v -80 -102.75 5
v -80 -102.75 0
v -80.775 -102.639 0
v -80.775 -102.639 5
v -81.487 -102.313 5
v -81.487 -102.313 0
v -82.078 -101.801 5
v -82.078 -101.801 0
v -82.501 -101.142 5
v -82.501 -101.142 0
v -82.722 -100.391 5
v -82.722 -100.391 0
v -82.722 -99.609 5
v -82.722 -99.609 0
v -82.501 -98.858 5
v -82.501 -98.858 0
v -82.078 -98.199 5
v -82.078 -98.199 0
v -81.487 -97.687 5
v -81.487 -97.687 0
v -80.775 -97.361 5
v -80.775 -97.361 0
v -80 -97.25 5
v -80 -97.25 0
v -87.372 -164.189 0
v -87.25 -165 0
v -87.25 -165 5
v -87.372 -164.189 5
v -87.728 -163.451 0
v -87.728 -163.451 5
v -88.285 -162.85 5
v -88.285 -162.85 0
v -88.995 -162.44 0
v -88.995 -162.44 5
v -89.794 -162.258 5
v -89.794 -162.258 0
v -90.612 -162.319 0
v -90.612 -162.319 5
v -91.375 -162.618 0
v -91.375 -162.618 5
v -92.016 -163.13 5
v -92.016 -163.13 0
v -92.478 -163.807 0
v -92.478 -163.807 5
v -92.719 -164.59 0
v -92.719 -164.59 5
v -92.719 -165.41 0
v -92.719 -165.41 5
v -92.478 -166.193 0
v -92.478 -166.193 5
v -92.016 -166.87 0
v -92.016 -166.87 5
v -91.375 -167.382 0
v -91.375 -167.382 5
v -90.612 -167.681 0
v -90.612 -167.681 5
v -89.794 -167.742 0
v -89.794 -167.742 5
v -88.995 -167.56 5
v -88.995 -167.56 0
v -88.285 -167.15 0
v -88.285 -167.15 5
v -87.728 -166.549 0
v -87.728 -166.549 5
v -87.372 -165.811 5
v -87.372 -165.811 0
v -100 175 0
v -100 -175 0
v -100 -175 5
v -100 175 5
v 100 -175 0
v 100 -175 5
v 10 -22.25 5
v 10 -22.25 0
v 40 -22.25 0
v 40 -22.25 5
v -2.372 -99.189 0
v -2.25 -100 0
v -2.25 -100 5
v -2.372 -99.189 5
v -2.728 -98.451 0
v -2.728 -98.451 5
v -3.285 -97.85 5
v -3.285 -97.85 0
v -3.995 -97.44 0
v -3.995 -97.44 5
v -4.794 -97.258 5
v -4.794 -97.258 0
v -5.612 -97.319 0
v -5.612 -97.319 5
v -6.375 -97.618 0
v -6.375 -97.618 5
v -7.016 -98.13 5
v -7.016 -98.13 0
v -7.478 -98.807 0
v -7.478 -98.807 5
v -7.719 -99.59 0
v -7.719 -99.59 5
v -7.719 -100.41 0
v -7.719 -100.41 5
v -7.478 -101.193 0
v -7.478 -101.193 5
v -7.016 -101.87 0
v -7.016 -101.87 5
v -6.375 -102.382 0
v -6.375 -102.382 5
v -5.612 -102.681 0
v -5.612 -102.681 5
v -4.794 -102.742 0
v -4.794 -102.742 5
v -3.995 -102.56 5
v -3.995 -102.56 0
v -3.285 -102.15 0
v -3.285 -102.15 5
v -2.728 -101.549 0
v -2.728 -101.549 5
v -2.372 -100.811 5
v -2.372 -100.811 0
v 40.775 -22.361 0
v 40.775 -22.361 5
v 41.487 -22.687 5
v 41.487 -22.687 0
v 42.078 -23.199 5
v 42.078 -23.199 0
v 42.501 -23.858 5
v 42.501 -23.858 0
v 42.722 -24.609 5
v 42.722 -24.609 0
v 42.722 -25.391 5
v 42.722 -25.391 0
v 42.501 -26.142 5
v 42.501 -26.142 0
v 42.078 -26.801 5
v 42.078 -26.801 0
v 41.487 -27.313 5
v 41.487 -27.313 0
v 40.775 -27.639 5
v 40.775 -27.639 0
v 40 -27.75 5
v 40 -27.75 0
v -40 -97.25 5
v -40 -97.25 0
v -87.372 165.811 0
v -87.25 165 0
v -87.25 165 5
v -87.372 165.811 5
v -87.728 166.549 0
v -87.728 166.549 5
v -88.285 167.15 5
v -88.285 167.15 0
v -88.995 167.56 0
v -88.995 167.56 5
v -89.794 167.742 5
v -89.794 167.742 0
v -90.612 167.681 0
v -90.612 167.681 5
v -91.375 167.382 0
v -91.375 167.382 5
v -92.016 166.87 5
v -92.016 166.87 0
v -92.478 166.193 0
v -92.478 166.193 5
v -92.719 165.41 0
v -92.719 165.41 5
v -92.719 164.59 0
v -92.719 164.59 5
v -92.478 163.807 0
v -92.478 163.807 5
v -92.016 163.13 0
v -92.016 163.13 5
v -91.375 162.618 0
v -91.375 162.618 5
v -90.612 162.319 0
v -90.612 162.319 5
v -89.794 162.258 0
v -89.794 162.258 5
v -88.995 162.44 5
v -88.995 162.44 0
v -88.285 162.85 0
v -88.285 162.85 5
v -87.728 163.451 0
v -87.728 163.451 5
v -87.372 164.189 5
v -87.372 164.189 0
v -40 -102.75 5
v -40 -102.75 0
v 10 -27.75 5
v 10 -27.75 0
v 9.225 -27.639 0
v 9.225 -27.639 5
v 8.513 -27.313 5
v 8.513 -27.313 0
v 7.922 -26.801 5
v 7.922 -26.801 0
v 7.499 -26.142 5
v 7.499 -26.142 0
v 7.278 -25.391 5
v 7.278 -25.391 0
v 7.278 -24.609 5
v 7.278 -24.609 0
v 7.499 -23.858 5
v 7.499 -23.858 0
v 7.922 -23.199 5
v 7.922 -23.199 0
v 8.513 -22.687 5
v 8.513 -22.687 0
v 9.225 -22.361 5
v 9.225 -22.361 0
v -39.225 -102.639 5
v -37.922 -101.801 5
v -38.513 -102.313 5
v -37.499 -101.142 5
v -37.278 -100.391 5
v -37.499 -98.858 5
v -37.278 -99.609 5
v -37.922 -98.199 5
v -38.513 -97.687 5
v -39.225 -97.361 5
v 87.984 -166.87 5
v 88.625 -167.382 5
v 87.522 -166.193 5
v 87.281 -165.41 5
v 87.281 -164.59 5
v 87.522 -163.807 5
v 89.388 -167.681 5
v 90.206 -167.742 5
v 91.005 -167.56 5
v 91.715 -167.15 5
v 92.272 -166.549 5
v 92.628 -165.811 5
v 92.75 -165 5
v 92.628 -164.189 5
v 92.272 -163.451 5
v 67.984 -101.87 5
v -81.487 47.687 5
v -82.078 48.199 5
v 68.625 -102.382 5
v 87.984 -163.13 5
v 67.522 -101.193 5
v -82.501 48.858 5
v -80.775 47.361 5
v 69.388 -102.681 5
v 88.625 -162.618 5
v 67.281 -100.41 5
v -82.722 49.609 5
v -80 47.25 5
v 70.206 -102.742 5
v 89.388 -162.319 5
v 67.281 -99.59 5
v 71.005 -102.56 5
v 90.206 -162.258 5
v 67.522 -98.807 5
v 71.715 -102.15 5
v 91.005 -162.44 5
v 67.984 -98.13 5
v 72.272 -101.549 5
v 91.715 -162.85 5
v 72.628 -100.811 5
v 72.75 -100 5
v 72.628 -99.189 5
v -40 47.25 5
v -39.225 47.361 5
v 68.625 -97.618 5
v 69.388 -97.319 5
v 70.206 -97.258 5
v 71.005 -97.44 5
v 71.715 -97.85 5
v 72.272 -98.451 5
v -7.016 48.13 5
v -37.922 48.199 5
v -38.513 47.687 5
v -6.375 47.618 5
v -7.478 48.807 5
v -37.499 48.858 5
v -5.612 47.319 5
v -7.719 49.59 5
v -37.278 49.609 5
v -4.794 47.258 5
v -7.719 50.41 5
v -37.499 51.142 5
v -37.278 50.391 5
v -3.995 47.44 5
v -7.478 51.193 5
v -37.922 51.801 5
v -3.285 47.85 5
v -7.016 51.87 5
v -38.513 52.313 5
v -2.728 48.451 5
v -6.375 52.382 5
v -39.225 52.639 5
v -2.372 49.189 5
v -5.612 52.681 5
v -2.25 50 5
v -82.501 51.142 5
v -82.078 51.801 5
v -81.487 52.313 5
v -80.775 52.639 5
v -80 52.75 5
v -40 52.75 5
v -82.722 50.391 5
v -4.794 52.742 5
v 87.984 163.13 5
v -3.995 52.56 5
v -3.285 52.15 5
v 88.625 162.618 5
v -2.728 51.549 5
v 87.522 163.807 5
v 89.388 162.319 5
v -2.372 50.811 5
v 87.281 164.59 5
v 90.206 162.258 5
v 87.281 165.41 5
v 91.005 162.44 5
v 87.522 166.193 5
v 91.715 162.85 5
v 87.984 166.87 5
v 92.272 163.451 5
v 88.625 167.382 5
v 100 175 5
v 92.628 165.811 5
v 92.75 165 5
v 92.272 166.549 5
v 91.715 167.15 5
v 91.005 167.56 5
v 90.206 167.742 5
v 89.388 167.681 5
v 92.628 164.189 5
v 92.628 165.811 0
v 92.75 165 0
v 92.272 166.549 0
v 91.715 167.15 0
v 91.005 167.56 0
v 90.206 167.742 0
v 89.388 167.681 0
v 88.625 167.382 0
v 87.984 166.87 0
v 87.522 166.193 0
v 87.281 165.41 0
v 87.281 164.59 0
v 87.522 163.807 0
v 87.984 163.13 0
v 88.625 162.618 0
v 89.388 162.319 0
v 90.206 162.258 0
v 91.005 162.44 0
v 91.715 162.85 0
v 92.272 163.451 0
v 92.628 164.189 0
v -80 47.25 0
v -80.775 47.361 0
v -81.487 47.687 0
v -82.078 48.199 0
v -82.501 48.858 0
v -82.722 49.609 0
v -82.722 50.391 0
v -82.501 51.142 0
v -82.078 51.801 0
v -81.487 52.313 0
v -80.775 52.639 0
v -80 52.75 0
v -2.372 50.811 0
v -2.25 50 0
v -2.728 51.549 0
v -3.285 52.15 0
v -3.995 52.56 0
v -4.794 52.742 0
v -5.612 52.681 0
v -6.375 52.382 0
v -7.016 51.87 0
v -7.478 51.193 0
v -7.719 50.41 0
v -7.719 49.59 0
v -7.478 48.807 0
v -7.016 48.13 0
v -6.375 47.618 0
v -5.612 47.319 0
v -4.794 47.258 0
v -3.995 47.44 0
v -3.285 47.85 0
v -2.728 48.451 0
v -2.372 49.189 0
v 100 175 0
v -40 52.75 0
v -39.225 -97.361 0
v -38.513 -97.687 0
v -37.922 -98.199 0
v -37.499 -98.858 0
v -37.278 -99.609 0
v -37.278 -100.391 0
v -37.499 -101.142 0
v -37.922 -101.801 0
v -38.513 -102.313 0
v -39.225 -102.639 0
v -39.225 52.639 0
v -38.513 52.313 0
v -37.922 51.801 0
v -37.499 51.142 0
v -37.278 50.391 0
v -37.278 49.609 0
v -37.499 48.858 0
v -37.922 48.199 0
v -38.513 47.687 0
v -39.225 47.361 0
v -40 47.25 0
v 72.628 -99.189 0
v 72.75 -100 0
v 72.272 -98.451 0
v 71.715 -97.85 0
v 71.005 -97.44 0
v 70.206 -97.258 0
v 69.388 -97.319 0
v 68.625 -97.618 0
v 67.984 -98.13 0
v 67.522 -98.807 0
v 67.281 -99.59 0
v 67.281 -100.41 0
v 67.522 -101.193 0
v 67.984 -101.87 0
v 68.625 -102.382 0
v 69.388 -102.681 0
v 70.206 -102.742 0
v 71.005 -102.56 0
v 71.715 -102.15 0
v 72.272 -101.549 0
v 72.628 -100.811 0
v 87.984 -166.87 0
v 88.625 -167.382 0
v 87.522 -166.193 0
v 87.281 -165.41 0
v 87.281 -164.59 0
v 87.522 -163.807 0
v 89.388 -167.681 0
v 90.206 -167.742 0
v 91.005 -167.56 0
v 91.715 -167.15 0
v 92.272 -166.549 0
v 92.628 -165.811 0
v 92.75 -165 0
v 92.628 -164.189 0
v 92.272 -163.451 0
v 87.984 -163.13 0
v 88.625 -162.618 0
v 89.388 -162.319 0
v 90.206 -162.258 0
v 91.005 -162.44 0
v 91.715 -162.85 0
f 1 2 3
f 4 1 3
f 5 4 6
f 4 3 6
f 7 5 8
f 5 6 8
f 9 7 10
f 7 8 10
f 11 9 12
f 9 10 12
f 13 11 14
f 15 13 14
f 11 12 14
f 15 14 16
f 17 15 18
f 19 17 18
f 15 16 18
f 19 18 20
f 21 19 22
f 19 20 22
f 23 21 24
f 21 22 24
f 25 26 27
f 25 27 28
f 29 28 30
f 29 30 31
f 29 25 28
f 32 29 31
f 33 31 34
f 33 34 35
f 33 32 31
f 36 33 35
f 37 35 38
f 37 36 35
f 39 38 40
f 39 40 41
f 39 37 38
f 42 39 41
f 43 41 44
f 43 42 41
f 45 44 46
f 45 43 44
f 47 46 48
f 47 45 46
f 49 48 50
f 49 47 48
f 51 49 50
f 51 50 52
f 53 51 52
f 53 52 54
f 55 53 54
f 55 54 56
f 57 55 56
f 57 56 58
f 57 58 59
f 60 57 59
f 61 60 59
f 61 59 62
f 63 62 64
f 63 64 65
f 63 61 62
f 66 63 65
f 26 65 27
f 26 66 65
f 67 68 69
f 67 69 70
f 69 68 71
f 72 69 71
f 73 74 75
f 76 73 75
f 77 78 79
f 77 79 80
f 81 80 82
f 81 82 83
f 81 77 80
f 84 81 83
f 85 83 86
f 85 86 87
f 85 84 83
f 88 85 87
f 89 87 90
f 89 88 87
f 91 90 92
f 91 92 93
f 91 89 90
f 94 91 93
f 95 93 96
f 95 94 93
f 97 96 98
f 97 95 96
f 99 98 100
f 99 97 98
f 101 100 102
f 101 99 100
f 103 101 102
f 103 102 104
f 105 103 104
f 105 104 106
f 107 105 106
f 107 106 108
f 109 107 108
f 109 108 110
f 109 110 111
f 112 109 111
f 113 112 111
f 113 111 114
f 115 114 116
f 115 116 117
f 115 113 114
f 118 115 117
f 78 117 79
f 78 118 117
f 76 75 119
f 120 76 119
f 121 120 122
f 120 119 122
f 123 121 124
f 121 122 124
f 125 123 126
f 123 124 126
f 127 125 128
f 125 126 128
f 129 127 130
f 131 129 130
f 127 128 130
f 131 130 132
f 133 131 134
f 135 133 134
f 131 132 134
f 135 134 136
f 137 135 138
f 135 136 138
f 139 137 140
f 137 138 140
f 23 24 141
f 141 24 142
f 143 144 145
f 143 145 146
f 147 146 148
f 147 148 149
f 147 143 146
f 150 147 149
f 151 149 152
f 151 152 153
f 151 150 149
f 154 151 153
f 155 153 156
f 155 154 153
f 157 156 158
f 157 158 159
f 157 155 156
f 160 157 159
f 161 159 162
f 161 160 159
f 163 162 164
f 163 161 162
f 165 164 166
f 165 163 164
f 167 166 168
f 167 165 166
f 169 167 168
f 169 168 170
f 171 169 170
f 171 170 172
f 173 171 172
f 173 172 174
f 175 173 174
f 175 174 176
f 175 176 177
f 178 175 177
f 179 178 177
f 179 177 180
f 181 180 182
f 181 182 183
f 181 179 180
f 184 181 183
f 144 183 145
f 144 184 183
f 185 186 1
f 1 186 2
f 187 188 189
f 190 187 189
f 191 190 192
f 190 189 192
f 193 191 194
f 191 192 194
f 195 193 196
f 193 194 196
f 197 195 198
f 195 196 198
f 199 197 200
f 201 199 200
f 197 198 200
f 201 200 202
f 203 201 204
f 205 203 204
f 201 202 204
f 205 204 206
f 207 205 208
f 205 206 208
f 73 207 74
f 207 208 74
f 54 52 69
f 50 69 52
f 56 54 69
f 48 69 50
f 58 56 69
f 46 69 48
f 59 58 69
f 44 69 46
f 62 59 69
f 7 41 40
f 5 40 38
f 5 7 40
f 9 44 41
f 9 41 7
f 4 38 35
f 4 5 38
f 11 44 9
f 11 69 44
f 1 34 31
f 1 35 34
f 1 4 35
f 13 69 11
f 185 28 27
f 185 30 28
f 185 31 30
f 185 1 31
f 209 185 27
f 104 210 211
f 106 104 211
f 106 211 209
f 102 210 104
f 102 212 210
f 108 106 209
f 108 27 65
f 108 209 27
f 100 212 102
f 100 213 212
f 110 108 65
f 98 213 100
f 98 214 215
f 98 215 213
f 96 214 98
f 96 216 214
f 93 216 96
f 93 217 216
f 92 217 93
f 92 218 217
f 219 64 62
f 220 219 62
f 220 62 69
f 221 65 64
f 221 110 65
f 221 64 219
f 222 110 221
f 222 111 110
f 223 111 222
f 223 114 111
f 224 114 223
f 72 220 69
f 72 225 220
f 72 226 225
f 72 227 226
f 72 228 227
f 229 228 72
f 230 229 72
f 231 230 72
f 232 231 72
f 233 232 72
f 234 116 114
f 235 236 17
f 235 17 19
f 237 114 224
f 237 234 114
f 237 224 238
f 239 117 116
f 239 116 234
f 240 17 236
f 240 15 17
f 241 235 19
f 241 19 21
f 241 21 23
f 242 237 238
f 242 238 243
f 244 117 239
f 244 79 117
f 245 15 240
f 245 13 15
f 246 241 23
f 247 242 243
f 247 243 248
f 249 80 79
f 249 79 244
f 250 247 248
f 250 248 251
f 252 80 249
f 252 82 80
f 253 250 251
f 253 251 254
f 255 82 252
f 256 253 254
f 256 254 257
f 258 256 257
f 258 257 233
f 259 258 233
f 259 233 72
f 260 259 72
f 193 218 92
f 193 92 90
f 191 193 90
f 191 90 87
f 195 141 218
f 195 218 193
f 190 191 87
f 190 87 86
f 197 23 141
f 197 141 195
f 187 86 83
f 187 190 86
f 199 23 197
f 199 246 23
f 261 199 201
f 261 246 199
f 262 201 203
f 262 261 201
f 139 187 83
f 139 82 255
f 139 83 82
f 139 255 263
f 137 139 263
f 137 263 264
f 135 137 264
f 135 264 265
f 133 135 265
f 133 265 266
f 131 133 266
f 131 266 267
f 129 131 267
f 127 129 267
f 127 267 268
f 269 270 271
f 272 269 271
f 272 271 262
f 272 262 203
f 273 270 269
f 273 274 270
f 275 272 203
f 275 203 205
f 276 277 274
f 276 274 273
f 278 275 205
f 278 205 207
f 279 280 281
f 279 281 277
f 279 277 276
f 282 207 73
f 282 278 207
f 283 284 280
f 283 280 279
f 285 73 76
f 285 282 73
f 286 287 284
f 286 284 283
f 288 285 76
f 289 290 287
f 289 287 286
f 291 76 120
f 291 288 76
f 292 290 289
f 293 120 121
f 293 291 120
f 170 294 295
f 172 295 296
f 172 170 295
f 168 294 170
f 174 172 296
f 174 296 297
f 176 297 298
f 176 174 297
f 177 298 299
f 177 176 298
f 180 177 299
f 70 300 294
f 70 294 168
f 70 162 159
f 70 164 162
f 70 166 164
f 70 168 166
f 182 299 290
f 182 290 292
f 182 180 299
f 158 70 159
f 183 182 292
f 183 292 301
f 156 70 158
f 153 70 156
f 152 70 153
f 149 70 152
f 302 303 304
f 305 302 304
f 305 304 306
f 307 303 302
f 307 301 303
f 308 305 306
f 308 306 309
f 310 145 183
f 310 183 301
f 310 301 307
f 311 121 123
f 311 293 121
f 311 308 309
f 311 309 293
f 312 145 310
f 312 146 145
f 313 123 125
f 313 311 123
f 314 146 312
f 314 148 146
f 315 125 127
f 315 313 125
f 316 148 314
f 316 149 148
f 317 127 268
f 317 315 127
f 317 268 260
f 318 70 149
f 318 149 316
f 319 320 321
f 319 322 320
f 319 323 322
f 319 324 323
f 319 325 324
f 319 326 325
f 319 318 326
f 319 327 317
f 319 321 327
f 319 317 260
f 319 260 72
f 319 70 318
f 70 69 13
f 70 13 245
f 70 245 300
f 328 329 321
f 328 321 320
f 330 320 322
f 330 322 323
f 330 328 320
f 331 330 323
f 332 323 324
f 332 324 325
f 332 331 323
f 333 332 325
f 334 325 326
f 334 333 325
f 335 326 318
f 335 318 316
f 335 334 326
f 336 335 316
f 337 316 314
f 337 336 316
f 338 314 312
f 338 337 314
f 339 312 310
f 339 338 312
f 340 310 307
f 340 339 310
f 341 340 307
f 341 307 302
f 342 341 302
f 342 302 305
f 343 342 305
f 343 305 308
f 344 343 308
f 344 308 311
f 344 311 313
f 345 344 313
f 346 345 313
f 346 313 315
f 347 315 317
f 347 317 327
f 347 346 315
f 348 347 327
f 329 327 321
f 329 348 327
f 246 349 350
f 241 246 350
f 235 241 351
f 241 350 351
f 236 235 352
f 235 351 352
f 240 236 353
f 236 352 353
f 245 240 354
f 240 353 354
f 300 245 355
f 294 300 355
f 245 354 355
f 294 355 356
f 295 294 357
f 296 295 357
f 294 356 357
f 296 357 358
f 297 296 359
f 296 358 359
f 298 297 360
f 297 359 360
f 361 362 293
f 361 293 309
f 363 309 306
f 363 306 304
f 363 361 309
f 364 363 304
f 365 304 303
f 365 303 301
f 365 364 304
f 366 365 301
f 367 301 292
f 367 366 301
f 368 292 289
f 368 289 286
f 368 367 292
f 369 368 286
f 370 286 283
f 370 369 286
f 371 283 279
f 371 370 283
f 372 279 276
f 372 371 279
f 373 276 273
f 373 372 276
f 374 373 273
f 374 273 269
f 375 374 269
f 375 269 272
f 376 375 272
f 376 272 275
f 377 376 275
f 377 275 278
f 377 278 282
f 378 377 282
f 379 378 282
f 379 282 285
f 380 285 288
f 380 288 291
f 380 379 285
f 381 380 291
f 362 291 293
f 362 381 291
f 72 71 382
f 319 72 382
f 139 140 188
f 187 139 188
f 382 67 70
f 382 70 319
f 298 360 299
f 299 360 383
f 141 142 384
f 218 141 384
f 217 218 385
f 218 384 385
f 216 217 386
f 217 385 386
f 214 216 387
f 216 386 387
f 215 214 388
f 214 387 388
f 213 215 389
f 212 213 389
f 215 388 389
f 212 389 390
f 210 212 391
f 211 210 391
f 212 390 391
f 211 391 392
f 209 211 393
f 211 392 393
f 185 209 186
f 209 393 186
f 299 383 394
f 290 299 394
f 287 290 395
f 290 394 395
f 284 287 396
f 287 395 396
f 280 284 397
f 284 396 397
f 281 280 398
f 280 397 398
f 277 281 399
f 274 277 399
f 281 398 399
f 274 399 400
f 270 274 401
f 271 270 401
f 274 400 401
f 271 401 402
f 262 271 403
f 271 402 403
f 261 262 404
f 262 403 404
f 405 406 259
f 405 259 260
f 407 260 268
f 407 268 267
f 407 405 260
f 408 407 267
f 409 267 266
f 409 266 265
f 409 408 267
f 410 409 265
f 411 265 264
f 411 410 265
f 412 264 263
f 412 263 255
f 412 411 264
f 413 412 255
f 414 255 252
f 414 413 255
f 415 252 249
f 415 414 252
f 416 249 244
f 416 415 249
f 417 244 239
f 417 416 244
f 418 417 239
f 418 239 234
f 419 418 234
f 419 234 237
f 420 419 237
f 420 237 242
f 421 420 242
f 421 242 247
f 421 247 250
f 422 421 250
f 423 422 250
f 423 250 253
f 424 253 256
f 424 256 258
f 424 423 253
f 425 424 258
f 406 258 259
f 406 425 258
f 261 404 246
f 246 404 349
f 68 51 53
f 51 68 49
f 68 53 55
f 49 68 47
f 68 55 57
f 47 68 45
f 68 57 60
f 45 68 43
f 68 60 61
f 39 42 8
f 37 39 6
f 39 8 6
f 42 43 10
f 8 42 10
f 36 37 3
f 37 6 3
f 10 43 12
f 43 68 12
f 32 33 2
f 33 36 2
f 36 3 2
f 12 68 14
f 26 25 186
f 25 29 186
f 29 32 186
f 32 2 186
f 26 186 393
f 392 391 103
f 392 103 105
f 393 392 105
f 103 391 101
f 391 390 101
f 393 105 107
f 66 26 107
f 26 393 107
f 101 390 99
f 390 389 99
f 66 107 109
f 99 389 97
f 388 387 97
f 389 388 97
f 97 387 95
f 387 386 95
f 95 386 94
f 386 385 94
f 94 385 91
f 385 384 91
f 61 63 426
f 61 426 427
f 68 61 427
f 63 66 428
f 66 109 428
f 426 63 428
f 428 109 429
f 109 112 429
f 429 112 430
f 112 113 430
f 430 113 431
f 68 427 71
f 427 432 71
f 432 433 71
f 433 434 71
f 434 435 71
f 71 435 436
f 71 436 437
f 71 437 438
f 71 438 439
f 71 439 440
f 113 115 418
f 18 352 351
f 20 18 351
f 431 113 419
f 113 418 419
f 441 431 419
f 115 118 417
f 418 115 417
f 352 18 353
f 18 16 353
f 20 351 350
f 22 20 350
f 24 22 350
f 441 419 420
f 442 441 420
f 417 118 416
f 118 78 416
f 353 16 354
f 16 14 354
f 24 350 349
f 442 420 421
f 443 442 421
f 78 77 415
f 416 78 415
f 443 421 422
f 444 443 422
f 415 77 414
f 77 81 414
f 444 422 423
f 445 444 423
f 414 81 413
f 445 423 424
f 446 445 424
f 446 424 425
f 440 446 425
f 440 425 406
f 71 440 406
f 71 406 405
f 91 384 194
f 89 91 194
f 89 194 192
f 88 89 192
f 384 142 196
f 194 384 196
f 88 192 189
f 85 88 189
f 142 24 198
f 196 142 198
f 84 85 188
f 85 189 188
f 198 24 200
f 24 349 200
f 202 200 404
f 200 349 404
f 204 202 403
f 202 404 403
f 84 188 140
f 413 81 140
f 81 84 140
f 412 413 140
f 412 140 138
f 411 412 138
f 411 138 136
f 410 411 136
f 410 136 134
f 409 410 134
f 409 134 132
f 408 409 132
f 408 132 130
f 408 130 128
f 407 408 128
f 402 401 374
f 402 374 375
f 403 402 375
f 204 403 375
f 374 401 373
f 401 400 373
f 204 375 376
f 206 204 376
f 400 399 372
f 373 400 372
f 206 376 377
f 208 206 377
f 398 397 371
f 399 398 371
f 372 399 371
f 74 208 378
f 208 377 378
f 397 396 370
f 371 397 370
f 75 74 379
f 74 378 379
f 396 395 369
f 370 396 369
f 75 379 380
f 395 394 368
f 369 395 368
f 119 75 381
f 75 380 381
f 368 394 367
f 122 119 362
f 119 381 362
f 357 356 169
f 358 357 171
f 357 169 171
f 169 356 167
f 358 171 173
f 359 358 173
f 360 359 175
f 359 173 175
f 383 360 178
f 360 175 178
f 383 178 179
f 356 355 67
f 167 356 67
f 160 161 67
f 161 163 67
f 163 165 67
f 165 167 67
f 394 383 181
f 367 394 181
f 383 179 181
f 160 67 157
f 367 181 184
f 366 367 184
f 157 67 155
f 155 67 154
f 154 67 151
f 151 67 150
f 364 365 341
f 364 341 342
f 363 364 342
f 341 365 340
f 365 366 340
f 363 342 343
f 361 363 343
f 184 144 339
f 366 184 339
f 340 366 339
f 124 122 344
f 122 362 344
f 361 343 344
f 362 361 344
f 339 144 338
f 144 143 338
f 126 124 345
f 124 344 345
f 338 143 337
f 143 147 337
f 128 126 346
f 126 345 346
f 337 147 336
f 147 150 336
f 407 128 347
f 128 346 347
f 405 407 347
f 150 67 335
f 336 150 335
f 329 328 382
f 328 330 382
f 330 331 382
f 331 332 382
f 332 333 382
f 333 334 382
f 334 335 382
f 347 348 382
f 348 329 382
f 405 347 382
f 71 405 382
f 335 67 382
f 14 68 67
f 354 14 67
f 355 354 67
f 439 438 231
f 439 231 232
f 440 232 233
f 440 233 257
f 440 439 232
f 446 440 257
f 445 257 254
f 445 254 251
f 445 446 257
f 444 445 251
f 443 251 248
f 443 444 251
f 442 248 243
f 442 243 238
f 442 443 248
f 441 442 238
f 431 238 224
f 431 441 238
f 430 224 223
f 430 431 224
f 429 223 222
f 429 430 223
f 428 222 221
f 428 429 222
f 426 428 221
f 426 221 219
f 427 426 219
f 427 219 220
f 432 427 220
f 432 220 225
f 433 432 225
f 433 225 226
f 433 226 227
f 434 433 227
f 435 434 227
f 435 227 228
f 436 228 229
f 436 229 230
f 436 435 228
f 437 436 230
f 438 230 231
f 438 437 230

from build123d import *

# Parameters (mm, degrees)
F0_W     = 200
F0_H     = 350
F0_R     = 2.75
F1_DEPTH = 5


with BuildPart() as f1:
    # F0 (on Top) → F1 (new body)
    with BuildSketch(Plane.XY):
        Rectangle(F0_W, F0_H)
        with Locations((-90, -165)):
            Circle(F0_R, mode=Mode.SUBTRACT)
        with BuildLine():
            ThreePointArc((-80, -102.75), (-82.75, -100), (-80, -97.25))
            Line((-80, -97.25), (-60, -97.25))
            Line((-60, -97.25), (-40, -97.25))
            ThreePointArc((-40, -97.25), (-37.25, -100), (-40, -102.75))
            Line((-40, -102.75), (-60, -102.75))
            Line((-60, -102.75), (-80, -102.75))
        make_face(mode=Mode.SUBTRACT)
        with Locations((-5, -100)):
            Circle(F0_R, mode=Mode.SUBTRACT)
        with Locations((90, -165)):
            Circle(F0_R, mode=Mode.SUBTRACT)
        with Locations((70, -100)):
            Circle(F0_R, mode=Mode.SUBTRACT)
        with BuildLine():
            ThreePointArc((40, -22.25), (42.75, -25), (40, -27.75))
            Line((40, -27.75), (25, -27.75))
            Line((25, -27.75), (10, -27.75))
            ThreePointArc((10, -27.75), (7.25, -25), (10, -22.25))
            Line((10, -22.25), (25, -22.25))
            Line((25, -22.25), (40, -22.25))
        make_face(mode=Mode.SUBTRACT)
        with BuildLine():
            ThreePointArc((-40, 52.75), (-37.25, 50), (-40, 47.25))
            Line((-40, 47.25), (-60, 47.25))
            Line((-60, 47.25), (-80, 47.25))
            ThreePointArc((-80, 47.25), (-82.75, 50), (-80, 52.75))
            Line((-80, 52.75), (-60, 52.75))
            Line((-60, 52.75), (-40, 52.75))
        make_face(mode=Mode.SUBTRACT)
        with Locations((-5, 50)):
            Circle(F0_R, mode=Mode.SUBTRACT)
        with Locations((-90, 165)):
            Circle(F0_R, mode=Mode.SUBTRACT)
        with Locations((90, 165)):
            Circle(F0_R, mode=Mode.SUBTRACT)
    extrude(amount=F1_DEPTH)


solid = f1.part
